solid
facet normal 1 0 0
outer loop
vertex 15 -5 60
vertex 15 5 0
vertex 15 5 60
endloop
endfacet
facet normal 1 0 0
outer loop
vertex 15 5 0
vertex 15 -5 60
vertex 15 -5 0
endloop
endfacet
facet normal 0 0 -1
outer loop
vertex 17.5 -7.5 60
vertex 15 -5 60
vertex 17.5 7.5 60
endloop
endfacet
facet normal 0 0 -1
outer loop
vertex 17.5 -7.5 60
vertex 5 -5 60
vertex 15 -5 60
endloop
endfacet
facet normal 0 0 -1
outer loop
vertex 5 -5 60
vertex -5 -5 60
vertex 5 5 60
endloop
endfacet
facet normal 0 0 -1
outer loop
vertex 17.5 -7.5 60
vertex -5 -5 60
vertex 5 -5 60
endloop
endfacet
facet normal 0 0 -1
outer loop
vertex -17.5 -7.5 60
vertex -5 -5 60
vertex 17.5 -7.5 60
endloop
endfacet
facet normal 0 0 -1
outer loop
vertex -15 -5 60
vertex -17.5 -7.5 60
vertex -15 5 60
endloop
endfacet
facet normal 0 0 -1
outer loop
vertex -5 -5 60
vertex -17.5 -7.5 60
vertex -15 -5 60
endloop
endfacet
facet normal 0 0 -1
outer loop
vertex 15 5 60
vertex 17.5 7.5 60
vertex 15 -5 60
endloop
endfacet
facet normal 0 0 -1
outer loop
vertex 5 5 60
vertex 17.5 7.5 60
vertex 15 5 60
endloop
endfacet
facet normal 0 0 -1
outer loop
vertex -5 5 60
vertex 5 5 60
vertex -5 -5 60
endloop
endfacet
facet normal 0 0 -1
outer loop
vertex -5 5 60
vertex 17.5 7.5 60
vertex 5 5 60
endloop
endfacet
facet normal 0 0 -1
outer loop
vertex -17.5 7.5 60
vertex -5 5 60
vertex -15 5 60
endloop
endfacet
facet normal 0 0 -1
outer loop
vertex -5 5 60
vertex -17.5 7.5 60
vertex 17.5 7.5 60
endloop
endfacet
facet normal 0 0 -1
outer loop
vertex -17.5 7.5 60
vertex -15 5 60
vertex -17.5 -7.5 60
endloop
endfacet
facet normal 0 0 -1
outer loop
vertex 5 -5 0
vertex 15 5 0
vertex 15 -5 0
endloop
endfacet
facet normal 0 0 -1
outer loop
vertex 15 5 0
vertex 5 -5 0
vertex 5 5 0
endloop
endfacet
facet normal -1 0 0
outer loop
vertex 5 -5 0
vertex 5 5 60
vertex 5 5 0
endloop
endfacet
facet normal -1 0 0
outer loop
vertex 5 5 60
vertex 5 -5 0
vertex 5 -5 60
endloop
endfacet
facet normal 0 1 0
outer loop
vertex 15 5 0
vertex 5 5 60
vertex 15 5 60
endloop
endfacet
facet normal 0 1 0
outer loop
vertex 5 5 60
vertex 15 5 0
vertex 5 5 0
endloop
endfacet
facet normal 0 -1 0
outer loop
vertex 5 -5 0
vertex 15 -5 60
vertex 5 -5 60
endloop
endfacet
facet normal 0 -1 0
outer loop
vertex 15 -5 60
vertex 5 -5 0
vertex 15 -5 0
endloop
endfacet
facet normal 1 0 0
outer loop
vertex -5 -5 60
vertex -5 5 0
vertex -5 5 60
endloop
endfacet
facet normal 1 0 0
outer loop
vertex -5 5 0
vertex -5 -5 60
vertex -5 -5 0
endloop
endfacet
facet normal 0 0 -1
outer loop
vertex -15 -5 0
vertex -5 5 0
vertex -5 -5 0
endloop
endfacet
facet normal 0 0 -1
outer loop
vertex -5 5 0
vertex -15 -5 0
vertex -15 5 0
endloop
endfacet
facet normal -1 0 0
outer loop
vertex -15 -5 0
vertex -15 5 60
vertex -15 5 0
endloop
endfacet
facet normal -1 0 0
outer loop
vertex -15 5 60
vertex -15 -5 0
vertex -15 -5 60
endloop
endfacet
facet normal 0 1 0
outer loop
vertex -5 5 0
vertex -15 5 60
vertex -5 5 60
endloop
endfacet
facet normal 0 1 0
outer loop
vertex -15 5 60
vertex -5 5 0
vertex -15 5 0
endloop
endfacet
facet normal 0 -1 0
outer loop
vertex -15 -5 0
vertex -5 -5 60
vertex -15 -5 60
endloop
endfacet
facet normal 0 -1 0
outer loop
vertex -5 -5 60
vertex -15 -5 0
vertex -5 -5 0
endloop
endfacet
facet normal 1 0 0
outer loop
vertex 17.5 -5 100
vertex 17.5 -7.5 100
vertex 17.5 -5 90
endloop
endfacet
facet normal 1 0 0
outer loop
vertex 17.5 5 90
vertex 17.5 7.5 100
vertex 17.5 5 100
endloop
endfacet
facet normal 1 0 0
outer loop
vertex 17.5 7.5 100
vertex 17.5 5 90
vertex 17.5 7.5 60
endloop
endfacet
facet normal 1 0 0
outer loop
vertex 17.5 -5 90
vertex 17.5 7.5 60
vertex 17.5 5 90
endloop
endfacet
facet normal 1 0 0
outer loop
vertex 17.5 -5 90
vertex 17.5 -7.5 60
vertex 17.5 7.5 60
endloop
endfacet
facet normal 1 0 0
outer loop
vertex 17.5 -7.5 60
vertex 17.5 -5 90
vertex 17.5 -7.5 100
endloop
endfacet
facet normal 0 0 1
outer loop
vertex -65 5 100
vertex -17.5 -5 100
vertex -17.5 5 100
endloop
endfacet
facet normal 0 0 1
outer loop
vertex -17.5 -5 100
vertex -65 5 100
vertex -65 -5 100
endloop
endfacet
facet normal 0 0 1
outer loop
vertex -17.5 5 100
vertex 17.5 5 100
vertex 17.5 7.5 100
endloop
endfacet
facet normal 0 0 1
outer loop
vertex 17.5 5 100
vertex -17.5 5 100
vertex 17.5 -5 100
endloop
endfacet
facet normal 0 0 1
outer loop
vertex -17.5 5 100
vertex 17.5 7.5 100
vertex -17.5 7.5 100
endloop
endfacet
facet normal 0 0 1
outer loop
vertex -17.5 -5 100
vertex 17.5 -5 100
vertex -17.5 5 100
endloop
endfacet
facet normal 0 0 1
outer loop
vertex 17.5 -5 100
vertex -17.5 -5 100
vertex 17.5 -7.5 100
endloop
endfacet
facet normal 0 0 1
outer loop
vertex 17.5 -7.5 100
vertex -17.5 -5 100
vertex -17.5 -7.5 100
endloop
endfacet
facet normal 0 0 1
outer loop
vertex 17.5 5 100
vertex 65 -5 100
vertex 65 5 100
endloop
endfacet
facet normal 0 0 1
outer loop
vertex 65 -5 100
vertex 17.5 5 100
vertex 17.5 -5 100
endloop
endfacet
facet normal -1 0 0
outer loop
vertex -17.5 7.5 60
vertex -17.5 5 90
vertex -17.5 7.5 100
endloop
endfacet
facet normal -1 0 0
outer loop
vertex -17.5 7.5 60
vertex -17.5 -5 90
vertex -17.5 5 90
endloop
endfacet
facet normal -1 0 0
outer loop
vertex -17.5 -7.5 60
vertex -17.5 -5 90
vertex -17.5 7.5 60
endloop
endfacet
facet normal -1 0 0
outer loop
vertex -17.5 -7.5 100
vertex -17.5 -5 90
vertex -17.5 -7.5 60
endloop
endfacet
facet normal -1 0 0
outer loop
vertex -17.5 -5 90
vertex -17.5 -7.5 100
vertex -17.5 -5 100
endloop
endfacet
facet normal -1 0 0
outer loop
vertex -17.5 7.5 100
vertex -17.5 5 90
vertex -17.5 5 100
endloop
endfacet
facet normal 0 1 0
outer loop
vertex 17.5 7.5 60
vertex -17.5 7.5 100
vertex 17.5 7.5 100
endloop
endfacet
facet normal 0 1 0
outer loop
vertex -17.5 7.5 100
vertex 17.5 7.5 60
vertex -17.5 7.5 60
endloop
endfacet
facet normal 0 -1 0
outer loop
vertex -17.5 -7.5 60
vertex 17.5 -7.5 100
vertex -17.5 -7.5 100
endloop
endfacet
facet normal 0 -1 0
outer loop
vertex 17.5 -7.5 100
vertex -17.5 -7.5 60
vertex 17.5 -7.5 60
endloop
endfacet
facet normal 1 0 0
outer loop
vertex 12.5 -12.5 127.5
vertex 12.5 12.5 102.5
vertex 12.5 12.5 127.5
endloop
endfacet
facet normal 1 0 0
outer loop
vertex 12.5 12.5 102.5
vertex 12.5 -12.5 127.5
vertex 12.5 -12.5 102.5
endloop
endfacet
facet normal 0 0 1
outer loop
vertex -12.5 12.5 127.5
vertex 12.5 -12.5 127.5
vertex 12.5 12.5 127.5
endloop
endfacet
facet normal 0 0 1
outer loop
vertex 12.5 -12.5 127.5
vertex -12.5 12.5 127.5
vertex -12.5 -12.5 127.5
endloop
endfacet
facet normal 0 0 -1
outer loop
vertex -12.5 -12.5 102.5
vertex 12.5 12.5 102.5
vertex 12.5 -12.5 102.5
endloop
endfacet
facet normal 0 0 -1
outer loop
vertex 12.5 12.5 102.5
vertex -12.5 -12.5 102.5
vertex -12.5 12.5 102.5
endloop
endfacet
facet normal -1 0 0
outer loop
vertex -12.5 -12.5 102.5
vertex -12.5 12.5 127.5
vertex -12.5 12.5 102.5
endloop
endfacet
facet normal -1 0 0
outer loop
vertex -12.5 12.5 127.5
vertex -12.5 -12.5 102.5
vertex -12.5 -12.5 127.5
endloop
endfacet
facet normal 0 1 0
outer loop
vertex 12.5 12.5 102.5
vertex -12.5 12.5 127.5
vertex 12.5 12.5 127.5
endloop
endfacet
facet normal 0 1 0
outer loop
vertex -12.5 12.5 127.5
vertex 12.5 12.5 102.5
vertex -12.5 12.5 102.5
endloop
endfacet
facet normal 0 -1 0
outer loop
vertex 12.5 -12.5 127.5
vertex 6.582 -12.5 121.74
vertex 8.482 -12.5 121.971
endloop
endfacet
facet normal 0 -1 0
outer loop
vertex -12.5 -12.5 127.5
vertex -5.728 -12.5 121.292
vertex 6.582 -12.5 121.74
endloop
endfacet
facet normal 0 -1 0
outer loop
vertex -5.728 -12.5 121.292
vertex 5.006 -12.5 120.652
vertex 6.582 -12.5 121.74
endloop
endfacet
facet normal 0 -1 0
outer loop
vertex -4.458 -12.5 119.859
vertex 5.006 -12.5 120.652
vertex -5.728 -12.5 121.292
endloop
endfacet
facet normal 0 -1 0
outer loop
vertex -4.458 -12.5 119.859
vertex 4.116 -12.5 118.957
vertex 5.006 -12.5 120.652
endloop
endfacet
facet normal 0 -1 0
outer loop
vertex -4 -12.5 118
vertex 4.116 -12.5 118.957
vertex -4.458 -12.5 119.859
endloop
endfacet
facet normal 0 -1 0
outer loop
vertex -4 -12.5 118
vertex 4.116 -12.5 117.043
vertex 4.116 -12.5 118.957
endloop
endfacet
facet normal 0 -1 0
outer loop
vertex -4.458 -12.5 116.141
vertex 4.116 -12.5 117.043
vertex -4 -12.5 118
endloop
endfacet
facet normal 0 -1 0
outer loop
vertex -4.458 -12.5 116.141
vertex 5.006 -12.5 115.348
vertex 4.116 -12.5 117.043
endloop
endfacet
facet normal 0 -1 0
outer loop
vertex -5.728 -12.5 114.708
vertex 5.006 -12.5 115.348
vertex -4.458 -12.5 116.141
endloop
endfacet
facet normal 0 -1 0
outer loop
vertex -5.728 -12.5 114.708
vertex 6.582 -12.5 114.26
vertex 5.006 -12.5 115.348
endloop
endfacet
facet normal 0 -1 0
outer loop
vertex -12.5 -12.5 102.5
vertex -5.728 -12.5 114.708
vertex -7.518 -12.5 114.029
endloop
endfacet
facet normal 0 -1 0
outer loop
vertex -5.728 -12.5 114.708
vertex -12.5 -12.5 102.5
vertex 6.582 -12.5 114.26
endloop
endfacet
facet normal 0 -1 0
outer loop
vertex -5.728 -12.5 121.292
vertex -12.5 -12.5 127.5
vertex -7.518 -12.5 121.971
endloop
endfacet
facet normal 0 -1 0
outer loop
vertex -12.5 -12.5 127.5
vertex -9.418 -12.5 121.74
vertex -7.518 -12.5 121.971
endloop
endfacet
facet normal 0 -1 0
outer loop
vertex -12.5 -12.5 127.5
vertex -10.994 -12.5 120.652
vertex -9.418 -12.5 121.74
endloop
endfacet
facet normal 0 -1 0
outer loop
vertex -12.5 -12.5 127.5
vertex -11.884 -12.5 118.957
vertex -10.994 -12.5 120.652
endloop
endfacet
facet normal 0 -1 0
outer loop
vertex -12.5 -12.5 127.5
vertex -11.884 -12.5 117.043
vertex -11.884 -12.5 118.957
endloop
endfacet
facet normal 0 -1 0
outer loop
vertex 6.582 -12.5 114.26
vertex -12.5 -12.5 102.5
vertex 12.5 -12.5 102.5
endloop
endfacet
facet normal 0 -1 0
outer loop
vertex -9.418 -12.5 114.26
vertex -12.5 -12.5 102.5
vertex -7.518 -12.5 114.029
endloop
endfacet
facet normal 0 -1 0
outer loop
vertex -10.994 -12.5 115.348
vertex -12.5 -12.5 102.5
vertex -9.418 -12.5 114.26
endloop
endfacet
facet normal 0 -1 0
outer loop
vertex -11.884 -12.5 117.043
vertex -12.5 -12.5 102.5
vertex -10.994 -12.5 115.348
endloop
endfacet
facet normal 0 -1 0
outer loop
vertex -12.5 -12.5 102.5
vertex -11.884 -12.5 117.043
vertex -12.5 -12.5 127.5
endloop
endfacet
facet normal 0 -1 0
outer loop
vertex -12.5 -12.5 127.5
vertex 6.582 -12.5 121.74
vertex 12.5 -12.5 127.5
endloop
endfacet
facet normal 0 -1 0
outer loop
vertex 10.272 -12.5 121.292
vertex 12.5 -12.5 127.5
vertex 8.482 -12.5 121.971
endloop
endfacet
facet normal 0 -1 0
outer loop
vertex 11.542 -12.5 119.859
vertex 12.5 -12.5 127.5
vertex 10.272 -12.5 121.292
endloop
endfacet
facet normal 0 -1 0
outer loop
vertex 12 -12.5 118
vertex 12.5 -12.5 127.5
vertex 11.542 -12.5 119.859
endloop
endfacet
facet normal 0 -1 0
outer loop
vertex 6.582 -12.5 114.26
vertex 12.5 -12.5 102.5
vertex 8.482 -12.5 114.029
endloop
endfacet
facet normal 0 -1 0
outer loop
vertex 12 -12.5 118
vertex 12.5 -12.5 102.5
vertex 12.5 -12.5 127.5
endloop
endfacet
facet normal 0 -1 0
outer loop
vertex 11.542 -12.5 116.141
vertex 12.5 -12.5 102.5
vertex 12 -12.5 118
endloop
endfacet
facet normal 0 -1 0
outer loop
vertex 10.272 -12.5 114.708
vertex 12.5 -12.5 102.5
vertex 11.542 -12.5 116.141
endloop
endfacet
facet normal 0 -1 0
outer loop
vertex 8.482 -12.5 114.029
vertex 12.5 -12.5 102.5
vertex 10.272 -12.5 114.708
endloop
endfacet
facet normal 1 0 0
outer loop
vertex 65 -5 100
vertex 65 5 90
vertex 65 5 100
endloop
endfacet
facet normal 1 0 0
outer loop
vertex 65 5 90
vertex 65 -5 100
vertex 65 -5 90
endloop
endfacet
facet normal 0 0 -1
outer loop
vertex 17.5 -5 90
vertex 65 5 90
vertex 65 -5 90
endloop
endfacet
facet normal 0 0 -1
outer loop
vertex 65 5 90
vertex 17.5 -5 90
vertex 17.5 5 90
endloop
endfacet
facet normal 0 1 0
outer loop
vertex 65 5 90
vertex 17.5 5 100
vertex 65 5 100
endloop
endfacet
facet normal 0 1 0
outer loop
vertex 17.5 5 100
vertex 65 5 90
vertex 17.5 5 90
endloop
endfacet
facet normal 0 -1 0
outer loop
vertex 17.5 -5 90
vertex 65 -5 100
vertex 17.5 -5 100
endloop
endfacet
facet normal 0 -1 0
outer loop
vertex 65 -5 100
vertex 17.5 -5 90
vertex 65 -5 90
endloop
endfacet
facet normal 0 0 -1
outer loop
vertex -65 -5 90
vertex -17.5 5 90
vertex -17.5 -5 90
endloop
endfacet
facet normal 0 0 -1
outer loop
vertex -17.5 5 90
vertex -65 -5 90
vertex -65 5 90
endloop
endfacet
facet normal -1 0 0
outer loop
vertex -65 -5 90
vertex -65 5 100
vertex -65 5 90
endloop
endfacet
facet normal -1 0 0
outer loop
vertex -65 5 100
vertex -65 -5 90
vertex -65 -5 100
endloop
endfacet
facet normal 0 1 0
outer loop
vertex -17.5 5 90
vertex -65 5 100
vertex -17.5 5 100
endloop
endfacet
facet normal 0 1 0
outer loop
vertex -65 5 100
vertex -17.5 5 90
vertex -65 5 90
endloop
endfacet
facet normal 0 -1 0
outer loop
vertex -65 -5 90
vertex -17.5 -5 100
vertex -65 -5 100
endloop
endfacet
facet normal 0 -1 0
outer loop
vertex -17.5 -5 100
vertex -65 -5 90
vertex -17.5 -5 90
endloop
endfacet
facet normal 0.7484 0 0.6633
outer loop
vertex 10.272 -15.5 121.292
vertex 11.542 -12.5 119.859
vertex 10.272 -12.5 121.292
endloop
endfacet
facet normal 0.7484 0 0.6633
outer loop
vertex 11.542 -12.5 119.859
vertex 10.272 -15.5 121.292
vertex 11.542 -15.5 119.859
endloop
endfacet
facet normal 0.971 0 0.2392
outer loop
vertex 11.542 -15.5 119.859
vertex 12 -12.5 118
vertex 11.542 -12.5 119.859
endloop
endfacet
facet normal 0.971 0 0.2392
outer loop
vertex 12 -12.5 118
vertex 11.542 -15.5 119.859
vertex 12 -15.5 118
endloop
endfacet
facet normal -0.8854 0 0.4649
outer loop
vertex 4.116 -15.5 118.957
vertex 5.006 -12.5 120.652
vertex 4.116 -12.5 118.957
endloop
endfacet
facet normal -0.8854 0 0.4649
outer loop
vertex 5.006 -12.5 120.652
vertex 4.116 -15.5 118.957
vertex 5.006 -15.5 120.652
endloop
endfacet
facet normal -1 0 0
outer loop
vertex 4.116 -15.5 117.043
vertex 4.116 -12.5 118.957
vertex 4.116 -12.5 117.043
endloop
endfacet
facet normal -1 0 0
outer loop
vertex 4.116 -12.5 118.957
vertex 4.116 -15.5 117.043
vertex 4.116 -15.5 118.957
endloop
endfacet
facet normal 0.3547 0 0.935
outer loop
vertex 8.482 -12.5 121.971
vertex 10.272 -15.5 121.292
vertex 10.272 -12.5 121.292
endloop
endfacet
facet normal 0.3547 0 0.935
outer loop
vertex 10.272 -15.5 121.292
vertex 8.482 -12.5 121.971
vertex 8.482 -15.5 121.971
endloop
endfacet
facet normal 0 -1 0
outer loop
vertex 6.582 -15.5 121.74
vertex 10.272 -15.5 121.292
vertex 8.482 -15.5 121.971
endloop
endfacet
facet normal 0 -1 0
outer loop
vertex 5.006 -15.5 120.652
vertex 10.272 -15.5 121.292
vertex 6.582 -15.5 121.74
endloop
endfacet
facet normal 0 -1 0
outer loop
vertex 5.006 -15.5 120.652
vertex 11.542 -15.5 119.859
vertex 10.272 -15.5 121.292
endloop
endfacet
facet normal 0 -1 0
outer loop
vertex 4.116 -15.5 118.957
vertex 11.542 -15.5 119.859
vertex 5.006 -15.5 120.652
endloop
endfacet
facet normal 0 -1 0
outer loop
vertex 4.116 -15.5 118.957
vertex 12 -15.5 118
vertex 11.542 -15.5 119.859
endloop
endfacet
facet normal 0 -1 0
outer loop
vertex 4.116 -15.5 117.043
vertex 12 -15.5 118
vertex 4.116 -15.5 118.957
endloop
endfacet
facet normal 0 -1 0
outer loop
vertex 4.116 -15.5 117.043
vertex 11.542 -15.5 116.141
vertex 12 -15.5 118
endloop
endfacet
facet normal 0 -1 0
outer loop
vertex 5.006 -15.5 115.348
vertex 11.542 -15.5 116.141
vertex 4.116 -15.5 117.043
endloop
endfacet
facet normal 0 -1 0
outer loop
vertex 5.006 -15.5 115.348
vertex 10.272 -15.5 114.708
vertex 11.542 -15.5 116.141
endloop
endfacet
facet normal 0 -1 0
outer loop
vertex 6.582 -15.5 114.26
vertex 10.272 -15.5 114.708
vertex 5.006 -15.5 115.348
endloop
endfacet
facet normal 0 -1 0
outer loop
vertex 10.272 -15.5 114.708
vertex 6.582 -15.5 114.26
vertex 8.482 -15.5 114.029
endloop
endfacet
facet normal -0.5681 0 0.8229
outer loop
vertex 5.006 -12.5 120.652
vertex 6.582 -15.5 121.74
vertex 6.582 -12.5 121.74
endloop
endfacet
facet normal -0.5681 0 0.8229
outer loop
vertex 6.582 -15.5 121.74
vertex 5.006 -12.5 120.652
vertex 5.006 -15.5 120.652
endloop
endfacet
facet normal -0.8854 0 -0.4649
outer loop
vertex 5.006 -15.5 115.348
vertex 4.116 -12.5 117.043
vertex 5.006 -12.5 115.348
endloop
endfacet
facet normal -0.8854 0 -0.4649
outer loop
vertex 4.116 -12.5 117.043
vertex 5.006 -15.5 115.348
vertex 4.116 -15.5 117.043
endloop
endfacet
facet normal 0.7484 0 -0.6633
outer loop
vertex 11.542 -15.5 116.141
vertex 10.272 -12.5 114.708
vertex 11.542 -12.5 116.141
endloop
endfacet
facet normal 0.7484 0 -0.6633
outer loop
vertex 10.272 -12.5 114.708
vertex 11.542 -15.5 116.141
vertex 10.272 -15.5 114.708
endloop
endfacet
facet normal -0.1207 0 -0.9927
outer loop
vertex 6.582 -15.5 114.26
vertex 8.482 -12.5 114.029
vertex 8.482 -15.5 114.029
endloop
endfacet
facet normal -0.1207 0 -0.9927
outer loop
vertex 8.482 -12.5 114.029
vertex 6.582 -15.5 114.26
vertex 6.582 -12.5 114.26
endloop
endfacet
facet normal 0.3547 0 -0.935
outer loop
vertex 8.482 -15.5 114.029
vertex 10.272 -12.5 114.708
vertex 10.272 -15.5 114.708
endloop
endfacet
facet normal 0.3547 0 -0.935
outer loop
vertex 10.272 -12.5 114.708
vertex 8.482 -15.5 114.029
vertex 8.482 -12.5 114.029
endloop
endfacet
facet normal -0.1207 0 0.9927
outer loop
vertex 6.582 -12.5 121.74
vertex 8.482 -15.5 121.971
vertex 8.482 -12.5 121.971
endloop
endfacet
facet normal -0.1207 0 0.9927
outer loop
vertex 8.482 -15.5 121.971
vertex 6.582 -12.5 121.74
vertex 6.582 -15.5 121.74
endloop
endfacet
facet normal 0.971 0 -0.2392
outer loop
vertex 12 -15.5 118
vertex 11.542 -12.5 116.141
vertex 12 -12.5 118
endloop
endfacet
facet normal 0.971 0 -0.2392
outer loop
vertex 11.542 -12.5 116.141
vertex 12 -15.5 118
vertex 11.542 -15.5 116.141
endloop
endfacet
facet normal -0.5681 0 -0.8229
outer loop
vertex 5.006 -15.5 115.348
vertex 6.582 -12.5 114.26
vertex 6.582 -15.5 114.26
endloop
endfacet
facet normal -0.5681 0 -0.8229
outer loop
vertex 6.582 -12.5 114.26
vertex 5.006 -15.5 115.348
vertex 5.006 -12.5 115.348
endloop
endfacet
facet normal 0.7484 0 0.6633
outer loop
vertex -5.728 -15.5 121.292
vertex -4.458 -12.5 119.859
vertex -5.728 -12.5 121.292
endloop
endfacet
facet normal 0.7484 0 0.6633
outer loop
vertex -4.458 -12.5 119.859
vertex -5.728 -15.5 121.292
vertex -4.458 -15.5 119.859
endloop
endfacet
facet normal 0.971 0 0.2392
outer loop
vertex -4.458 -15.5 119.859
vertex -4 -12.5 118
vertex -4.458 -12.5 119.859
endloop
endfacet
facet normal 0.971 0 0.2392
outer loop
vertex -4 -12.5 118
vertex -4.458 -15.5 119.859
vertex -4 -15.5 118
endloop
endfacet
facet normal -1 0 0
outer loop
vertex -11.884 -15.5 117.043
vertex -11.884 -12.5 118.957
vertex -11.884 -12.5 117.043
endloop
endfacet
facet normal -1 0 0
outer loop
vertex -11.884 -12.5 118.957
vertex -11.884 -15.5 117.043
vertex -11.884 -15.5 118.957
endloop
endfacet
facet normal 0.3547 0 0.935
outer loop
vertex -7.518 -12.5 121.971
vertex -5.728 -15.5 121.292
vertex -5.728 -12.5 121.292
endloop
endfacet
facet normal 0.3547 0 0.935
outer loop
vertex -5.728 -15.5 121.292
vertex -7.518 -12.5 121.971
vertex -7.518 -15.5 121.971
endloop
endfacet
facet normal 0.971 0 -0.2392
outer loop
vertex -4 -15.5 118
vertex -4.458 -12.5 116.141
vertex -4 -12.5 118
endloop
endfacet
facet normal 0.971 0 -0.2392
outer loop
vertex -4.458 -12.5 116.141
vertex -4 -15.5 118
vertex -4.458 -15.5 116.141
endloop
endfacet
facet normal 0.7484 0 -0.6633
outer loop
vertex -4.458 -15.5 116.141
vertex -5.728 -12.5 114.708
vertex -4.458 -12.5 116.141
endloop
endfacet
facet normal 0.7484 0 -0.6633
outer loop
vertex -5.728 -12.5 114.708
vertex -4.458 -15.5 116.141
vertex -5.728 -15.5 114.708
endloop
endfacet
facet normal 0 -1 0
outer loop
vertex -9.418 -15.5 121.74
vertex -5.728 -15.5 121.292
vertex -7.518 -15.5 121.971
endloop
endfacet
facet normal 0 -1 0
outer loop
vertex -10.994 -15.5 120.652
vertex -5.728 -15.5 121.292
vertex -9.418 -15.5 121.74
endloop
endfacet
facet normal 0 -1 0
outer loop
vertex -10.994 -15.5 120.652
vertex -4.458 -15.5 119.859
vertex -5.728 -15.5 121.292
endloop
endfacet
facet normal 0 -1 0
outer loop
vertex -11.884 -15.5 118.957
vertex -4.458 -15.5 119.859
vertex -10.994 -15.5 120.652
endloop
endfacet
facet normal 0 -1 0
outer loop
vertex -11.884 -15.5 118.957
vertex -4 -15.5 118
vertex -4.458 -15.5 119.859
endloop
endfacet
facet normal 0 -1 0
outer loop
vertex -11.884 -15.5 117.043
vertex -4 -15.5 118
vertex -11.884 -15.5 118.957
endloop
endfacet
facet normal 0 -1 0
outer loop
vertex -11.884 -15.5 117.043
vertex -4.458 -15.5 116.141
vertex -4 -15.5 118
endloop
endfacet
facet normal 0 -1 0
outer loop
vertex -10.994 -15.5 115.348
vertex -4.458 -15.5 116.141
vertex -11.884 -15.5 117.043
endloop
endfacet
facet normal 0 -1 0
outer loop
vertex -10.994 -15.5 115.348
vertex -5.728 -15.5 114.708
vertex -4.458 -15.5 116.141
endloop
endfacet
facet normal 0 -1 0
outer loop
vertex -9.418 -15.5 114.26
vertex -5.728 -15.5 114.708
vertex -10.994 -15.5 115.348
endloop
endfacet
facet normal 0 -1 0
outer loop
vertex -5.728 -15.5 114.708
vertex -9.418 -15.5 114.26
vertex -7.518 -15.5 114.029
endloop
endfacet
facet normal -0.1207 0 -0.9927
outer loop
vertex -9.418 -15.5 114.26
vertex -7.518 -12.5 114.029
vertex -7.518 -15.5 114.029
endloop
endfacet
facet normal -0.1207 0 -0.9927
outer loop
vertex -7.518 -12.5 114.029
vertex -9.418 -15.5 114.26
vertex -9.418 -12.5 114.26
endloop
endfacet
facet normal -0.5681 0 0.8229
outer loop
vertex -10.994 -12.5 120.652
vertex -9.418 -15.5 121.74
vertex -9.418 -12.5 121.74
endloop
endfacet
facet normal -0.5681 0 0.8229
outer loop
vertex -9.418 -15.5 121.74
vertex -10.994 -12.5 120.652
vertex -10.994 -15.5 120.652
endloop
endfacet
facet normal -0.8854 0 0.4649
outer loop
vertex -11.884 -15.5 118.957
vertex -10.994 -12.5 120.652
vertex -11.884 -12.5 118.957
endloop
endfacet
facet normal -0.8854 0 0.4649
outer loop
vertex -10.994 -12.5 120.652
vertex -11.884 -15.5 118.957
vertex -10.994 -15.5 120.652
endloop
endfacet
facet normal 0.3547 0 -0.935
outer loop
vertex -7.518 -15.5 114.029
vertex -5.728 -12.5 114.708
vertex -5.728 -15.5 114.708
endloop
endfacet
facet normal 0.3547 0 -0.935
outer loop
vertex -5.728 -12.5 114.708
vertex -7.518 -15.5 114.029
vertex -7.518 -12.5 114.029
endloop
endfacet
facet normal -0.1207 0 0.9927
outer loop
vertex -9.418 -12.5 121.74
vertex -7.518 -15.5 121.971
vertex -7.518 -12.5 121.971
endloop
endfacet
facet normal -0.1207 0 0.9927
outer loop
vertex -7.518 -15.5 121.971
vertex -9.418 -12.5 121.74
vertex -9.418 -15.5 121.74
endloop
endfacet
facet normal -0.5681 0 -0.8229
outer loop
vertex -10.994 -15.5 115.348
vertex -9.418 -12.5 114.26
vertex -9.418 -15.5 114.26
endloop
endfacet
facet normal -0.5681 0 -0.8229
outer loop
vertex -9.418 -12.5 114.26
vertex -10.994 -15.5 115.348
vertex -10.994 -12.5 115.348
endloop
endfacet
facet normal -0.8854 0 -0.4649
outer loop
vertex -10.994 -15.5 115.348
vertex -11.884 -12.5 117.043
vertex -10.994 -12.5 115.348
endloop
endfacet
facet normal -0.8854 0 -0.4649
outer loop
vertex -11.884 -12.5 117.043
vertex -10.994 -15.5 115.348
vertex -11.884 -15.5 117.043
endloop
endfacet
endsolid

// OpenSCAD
color("pink") {
translate([10,0,30]) cube([10,10,60],center=true);
translate([-10,0,30]) cube([10,10,60], center=true);
translate([-0,0,80]) cube([35,15,40], center=true);
translate([0,0,115])  cube([25,25,25],  center=true);
translate([40,0,95]) cube([50,10,10], center=true);
translate([-40,0,95]) cube([50,10,10], center=true);
}

color("black") {
translate([8,-10,118]) rotate([90,0,0]) cylinder(h=11,d=8,center=true);
translate([-8,-10,118]) rotate([90,0,0]) cylinder(h=11,d=8,center=true);
}
